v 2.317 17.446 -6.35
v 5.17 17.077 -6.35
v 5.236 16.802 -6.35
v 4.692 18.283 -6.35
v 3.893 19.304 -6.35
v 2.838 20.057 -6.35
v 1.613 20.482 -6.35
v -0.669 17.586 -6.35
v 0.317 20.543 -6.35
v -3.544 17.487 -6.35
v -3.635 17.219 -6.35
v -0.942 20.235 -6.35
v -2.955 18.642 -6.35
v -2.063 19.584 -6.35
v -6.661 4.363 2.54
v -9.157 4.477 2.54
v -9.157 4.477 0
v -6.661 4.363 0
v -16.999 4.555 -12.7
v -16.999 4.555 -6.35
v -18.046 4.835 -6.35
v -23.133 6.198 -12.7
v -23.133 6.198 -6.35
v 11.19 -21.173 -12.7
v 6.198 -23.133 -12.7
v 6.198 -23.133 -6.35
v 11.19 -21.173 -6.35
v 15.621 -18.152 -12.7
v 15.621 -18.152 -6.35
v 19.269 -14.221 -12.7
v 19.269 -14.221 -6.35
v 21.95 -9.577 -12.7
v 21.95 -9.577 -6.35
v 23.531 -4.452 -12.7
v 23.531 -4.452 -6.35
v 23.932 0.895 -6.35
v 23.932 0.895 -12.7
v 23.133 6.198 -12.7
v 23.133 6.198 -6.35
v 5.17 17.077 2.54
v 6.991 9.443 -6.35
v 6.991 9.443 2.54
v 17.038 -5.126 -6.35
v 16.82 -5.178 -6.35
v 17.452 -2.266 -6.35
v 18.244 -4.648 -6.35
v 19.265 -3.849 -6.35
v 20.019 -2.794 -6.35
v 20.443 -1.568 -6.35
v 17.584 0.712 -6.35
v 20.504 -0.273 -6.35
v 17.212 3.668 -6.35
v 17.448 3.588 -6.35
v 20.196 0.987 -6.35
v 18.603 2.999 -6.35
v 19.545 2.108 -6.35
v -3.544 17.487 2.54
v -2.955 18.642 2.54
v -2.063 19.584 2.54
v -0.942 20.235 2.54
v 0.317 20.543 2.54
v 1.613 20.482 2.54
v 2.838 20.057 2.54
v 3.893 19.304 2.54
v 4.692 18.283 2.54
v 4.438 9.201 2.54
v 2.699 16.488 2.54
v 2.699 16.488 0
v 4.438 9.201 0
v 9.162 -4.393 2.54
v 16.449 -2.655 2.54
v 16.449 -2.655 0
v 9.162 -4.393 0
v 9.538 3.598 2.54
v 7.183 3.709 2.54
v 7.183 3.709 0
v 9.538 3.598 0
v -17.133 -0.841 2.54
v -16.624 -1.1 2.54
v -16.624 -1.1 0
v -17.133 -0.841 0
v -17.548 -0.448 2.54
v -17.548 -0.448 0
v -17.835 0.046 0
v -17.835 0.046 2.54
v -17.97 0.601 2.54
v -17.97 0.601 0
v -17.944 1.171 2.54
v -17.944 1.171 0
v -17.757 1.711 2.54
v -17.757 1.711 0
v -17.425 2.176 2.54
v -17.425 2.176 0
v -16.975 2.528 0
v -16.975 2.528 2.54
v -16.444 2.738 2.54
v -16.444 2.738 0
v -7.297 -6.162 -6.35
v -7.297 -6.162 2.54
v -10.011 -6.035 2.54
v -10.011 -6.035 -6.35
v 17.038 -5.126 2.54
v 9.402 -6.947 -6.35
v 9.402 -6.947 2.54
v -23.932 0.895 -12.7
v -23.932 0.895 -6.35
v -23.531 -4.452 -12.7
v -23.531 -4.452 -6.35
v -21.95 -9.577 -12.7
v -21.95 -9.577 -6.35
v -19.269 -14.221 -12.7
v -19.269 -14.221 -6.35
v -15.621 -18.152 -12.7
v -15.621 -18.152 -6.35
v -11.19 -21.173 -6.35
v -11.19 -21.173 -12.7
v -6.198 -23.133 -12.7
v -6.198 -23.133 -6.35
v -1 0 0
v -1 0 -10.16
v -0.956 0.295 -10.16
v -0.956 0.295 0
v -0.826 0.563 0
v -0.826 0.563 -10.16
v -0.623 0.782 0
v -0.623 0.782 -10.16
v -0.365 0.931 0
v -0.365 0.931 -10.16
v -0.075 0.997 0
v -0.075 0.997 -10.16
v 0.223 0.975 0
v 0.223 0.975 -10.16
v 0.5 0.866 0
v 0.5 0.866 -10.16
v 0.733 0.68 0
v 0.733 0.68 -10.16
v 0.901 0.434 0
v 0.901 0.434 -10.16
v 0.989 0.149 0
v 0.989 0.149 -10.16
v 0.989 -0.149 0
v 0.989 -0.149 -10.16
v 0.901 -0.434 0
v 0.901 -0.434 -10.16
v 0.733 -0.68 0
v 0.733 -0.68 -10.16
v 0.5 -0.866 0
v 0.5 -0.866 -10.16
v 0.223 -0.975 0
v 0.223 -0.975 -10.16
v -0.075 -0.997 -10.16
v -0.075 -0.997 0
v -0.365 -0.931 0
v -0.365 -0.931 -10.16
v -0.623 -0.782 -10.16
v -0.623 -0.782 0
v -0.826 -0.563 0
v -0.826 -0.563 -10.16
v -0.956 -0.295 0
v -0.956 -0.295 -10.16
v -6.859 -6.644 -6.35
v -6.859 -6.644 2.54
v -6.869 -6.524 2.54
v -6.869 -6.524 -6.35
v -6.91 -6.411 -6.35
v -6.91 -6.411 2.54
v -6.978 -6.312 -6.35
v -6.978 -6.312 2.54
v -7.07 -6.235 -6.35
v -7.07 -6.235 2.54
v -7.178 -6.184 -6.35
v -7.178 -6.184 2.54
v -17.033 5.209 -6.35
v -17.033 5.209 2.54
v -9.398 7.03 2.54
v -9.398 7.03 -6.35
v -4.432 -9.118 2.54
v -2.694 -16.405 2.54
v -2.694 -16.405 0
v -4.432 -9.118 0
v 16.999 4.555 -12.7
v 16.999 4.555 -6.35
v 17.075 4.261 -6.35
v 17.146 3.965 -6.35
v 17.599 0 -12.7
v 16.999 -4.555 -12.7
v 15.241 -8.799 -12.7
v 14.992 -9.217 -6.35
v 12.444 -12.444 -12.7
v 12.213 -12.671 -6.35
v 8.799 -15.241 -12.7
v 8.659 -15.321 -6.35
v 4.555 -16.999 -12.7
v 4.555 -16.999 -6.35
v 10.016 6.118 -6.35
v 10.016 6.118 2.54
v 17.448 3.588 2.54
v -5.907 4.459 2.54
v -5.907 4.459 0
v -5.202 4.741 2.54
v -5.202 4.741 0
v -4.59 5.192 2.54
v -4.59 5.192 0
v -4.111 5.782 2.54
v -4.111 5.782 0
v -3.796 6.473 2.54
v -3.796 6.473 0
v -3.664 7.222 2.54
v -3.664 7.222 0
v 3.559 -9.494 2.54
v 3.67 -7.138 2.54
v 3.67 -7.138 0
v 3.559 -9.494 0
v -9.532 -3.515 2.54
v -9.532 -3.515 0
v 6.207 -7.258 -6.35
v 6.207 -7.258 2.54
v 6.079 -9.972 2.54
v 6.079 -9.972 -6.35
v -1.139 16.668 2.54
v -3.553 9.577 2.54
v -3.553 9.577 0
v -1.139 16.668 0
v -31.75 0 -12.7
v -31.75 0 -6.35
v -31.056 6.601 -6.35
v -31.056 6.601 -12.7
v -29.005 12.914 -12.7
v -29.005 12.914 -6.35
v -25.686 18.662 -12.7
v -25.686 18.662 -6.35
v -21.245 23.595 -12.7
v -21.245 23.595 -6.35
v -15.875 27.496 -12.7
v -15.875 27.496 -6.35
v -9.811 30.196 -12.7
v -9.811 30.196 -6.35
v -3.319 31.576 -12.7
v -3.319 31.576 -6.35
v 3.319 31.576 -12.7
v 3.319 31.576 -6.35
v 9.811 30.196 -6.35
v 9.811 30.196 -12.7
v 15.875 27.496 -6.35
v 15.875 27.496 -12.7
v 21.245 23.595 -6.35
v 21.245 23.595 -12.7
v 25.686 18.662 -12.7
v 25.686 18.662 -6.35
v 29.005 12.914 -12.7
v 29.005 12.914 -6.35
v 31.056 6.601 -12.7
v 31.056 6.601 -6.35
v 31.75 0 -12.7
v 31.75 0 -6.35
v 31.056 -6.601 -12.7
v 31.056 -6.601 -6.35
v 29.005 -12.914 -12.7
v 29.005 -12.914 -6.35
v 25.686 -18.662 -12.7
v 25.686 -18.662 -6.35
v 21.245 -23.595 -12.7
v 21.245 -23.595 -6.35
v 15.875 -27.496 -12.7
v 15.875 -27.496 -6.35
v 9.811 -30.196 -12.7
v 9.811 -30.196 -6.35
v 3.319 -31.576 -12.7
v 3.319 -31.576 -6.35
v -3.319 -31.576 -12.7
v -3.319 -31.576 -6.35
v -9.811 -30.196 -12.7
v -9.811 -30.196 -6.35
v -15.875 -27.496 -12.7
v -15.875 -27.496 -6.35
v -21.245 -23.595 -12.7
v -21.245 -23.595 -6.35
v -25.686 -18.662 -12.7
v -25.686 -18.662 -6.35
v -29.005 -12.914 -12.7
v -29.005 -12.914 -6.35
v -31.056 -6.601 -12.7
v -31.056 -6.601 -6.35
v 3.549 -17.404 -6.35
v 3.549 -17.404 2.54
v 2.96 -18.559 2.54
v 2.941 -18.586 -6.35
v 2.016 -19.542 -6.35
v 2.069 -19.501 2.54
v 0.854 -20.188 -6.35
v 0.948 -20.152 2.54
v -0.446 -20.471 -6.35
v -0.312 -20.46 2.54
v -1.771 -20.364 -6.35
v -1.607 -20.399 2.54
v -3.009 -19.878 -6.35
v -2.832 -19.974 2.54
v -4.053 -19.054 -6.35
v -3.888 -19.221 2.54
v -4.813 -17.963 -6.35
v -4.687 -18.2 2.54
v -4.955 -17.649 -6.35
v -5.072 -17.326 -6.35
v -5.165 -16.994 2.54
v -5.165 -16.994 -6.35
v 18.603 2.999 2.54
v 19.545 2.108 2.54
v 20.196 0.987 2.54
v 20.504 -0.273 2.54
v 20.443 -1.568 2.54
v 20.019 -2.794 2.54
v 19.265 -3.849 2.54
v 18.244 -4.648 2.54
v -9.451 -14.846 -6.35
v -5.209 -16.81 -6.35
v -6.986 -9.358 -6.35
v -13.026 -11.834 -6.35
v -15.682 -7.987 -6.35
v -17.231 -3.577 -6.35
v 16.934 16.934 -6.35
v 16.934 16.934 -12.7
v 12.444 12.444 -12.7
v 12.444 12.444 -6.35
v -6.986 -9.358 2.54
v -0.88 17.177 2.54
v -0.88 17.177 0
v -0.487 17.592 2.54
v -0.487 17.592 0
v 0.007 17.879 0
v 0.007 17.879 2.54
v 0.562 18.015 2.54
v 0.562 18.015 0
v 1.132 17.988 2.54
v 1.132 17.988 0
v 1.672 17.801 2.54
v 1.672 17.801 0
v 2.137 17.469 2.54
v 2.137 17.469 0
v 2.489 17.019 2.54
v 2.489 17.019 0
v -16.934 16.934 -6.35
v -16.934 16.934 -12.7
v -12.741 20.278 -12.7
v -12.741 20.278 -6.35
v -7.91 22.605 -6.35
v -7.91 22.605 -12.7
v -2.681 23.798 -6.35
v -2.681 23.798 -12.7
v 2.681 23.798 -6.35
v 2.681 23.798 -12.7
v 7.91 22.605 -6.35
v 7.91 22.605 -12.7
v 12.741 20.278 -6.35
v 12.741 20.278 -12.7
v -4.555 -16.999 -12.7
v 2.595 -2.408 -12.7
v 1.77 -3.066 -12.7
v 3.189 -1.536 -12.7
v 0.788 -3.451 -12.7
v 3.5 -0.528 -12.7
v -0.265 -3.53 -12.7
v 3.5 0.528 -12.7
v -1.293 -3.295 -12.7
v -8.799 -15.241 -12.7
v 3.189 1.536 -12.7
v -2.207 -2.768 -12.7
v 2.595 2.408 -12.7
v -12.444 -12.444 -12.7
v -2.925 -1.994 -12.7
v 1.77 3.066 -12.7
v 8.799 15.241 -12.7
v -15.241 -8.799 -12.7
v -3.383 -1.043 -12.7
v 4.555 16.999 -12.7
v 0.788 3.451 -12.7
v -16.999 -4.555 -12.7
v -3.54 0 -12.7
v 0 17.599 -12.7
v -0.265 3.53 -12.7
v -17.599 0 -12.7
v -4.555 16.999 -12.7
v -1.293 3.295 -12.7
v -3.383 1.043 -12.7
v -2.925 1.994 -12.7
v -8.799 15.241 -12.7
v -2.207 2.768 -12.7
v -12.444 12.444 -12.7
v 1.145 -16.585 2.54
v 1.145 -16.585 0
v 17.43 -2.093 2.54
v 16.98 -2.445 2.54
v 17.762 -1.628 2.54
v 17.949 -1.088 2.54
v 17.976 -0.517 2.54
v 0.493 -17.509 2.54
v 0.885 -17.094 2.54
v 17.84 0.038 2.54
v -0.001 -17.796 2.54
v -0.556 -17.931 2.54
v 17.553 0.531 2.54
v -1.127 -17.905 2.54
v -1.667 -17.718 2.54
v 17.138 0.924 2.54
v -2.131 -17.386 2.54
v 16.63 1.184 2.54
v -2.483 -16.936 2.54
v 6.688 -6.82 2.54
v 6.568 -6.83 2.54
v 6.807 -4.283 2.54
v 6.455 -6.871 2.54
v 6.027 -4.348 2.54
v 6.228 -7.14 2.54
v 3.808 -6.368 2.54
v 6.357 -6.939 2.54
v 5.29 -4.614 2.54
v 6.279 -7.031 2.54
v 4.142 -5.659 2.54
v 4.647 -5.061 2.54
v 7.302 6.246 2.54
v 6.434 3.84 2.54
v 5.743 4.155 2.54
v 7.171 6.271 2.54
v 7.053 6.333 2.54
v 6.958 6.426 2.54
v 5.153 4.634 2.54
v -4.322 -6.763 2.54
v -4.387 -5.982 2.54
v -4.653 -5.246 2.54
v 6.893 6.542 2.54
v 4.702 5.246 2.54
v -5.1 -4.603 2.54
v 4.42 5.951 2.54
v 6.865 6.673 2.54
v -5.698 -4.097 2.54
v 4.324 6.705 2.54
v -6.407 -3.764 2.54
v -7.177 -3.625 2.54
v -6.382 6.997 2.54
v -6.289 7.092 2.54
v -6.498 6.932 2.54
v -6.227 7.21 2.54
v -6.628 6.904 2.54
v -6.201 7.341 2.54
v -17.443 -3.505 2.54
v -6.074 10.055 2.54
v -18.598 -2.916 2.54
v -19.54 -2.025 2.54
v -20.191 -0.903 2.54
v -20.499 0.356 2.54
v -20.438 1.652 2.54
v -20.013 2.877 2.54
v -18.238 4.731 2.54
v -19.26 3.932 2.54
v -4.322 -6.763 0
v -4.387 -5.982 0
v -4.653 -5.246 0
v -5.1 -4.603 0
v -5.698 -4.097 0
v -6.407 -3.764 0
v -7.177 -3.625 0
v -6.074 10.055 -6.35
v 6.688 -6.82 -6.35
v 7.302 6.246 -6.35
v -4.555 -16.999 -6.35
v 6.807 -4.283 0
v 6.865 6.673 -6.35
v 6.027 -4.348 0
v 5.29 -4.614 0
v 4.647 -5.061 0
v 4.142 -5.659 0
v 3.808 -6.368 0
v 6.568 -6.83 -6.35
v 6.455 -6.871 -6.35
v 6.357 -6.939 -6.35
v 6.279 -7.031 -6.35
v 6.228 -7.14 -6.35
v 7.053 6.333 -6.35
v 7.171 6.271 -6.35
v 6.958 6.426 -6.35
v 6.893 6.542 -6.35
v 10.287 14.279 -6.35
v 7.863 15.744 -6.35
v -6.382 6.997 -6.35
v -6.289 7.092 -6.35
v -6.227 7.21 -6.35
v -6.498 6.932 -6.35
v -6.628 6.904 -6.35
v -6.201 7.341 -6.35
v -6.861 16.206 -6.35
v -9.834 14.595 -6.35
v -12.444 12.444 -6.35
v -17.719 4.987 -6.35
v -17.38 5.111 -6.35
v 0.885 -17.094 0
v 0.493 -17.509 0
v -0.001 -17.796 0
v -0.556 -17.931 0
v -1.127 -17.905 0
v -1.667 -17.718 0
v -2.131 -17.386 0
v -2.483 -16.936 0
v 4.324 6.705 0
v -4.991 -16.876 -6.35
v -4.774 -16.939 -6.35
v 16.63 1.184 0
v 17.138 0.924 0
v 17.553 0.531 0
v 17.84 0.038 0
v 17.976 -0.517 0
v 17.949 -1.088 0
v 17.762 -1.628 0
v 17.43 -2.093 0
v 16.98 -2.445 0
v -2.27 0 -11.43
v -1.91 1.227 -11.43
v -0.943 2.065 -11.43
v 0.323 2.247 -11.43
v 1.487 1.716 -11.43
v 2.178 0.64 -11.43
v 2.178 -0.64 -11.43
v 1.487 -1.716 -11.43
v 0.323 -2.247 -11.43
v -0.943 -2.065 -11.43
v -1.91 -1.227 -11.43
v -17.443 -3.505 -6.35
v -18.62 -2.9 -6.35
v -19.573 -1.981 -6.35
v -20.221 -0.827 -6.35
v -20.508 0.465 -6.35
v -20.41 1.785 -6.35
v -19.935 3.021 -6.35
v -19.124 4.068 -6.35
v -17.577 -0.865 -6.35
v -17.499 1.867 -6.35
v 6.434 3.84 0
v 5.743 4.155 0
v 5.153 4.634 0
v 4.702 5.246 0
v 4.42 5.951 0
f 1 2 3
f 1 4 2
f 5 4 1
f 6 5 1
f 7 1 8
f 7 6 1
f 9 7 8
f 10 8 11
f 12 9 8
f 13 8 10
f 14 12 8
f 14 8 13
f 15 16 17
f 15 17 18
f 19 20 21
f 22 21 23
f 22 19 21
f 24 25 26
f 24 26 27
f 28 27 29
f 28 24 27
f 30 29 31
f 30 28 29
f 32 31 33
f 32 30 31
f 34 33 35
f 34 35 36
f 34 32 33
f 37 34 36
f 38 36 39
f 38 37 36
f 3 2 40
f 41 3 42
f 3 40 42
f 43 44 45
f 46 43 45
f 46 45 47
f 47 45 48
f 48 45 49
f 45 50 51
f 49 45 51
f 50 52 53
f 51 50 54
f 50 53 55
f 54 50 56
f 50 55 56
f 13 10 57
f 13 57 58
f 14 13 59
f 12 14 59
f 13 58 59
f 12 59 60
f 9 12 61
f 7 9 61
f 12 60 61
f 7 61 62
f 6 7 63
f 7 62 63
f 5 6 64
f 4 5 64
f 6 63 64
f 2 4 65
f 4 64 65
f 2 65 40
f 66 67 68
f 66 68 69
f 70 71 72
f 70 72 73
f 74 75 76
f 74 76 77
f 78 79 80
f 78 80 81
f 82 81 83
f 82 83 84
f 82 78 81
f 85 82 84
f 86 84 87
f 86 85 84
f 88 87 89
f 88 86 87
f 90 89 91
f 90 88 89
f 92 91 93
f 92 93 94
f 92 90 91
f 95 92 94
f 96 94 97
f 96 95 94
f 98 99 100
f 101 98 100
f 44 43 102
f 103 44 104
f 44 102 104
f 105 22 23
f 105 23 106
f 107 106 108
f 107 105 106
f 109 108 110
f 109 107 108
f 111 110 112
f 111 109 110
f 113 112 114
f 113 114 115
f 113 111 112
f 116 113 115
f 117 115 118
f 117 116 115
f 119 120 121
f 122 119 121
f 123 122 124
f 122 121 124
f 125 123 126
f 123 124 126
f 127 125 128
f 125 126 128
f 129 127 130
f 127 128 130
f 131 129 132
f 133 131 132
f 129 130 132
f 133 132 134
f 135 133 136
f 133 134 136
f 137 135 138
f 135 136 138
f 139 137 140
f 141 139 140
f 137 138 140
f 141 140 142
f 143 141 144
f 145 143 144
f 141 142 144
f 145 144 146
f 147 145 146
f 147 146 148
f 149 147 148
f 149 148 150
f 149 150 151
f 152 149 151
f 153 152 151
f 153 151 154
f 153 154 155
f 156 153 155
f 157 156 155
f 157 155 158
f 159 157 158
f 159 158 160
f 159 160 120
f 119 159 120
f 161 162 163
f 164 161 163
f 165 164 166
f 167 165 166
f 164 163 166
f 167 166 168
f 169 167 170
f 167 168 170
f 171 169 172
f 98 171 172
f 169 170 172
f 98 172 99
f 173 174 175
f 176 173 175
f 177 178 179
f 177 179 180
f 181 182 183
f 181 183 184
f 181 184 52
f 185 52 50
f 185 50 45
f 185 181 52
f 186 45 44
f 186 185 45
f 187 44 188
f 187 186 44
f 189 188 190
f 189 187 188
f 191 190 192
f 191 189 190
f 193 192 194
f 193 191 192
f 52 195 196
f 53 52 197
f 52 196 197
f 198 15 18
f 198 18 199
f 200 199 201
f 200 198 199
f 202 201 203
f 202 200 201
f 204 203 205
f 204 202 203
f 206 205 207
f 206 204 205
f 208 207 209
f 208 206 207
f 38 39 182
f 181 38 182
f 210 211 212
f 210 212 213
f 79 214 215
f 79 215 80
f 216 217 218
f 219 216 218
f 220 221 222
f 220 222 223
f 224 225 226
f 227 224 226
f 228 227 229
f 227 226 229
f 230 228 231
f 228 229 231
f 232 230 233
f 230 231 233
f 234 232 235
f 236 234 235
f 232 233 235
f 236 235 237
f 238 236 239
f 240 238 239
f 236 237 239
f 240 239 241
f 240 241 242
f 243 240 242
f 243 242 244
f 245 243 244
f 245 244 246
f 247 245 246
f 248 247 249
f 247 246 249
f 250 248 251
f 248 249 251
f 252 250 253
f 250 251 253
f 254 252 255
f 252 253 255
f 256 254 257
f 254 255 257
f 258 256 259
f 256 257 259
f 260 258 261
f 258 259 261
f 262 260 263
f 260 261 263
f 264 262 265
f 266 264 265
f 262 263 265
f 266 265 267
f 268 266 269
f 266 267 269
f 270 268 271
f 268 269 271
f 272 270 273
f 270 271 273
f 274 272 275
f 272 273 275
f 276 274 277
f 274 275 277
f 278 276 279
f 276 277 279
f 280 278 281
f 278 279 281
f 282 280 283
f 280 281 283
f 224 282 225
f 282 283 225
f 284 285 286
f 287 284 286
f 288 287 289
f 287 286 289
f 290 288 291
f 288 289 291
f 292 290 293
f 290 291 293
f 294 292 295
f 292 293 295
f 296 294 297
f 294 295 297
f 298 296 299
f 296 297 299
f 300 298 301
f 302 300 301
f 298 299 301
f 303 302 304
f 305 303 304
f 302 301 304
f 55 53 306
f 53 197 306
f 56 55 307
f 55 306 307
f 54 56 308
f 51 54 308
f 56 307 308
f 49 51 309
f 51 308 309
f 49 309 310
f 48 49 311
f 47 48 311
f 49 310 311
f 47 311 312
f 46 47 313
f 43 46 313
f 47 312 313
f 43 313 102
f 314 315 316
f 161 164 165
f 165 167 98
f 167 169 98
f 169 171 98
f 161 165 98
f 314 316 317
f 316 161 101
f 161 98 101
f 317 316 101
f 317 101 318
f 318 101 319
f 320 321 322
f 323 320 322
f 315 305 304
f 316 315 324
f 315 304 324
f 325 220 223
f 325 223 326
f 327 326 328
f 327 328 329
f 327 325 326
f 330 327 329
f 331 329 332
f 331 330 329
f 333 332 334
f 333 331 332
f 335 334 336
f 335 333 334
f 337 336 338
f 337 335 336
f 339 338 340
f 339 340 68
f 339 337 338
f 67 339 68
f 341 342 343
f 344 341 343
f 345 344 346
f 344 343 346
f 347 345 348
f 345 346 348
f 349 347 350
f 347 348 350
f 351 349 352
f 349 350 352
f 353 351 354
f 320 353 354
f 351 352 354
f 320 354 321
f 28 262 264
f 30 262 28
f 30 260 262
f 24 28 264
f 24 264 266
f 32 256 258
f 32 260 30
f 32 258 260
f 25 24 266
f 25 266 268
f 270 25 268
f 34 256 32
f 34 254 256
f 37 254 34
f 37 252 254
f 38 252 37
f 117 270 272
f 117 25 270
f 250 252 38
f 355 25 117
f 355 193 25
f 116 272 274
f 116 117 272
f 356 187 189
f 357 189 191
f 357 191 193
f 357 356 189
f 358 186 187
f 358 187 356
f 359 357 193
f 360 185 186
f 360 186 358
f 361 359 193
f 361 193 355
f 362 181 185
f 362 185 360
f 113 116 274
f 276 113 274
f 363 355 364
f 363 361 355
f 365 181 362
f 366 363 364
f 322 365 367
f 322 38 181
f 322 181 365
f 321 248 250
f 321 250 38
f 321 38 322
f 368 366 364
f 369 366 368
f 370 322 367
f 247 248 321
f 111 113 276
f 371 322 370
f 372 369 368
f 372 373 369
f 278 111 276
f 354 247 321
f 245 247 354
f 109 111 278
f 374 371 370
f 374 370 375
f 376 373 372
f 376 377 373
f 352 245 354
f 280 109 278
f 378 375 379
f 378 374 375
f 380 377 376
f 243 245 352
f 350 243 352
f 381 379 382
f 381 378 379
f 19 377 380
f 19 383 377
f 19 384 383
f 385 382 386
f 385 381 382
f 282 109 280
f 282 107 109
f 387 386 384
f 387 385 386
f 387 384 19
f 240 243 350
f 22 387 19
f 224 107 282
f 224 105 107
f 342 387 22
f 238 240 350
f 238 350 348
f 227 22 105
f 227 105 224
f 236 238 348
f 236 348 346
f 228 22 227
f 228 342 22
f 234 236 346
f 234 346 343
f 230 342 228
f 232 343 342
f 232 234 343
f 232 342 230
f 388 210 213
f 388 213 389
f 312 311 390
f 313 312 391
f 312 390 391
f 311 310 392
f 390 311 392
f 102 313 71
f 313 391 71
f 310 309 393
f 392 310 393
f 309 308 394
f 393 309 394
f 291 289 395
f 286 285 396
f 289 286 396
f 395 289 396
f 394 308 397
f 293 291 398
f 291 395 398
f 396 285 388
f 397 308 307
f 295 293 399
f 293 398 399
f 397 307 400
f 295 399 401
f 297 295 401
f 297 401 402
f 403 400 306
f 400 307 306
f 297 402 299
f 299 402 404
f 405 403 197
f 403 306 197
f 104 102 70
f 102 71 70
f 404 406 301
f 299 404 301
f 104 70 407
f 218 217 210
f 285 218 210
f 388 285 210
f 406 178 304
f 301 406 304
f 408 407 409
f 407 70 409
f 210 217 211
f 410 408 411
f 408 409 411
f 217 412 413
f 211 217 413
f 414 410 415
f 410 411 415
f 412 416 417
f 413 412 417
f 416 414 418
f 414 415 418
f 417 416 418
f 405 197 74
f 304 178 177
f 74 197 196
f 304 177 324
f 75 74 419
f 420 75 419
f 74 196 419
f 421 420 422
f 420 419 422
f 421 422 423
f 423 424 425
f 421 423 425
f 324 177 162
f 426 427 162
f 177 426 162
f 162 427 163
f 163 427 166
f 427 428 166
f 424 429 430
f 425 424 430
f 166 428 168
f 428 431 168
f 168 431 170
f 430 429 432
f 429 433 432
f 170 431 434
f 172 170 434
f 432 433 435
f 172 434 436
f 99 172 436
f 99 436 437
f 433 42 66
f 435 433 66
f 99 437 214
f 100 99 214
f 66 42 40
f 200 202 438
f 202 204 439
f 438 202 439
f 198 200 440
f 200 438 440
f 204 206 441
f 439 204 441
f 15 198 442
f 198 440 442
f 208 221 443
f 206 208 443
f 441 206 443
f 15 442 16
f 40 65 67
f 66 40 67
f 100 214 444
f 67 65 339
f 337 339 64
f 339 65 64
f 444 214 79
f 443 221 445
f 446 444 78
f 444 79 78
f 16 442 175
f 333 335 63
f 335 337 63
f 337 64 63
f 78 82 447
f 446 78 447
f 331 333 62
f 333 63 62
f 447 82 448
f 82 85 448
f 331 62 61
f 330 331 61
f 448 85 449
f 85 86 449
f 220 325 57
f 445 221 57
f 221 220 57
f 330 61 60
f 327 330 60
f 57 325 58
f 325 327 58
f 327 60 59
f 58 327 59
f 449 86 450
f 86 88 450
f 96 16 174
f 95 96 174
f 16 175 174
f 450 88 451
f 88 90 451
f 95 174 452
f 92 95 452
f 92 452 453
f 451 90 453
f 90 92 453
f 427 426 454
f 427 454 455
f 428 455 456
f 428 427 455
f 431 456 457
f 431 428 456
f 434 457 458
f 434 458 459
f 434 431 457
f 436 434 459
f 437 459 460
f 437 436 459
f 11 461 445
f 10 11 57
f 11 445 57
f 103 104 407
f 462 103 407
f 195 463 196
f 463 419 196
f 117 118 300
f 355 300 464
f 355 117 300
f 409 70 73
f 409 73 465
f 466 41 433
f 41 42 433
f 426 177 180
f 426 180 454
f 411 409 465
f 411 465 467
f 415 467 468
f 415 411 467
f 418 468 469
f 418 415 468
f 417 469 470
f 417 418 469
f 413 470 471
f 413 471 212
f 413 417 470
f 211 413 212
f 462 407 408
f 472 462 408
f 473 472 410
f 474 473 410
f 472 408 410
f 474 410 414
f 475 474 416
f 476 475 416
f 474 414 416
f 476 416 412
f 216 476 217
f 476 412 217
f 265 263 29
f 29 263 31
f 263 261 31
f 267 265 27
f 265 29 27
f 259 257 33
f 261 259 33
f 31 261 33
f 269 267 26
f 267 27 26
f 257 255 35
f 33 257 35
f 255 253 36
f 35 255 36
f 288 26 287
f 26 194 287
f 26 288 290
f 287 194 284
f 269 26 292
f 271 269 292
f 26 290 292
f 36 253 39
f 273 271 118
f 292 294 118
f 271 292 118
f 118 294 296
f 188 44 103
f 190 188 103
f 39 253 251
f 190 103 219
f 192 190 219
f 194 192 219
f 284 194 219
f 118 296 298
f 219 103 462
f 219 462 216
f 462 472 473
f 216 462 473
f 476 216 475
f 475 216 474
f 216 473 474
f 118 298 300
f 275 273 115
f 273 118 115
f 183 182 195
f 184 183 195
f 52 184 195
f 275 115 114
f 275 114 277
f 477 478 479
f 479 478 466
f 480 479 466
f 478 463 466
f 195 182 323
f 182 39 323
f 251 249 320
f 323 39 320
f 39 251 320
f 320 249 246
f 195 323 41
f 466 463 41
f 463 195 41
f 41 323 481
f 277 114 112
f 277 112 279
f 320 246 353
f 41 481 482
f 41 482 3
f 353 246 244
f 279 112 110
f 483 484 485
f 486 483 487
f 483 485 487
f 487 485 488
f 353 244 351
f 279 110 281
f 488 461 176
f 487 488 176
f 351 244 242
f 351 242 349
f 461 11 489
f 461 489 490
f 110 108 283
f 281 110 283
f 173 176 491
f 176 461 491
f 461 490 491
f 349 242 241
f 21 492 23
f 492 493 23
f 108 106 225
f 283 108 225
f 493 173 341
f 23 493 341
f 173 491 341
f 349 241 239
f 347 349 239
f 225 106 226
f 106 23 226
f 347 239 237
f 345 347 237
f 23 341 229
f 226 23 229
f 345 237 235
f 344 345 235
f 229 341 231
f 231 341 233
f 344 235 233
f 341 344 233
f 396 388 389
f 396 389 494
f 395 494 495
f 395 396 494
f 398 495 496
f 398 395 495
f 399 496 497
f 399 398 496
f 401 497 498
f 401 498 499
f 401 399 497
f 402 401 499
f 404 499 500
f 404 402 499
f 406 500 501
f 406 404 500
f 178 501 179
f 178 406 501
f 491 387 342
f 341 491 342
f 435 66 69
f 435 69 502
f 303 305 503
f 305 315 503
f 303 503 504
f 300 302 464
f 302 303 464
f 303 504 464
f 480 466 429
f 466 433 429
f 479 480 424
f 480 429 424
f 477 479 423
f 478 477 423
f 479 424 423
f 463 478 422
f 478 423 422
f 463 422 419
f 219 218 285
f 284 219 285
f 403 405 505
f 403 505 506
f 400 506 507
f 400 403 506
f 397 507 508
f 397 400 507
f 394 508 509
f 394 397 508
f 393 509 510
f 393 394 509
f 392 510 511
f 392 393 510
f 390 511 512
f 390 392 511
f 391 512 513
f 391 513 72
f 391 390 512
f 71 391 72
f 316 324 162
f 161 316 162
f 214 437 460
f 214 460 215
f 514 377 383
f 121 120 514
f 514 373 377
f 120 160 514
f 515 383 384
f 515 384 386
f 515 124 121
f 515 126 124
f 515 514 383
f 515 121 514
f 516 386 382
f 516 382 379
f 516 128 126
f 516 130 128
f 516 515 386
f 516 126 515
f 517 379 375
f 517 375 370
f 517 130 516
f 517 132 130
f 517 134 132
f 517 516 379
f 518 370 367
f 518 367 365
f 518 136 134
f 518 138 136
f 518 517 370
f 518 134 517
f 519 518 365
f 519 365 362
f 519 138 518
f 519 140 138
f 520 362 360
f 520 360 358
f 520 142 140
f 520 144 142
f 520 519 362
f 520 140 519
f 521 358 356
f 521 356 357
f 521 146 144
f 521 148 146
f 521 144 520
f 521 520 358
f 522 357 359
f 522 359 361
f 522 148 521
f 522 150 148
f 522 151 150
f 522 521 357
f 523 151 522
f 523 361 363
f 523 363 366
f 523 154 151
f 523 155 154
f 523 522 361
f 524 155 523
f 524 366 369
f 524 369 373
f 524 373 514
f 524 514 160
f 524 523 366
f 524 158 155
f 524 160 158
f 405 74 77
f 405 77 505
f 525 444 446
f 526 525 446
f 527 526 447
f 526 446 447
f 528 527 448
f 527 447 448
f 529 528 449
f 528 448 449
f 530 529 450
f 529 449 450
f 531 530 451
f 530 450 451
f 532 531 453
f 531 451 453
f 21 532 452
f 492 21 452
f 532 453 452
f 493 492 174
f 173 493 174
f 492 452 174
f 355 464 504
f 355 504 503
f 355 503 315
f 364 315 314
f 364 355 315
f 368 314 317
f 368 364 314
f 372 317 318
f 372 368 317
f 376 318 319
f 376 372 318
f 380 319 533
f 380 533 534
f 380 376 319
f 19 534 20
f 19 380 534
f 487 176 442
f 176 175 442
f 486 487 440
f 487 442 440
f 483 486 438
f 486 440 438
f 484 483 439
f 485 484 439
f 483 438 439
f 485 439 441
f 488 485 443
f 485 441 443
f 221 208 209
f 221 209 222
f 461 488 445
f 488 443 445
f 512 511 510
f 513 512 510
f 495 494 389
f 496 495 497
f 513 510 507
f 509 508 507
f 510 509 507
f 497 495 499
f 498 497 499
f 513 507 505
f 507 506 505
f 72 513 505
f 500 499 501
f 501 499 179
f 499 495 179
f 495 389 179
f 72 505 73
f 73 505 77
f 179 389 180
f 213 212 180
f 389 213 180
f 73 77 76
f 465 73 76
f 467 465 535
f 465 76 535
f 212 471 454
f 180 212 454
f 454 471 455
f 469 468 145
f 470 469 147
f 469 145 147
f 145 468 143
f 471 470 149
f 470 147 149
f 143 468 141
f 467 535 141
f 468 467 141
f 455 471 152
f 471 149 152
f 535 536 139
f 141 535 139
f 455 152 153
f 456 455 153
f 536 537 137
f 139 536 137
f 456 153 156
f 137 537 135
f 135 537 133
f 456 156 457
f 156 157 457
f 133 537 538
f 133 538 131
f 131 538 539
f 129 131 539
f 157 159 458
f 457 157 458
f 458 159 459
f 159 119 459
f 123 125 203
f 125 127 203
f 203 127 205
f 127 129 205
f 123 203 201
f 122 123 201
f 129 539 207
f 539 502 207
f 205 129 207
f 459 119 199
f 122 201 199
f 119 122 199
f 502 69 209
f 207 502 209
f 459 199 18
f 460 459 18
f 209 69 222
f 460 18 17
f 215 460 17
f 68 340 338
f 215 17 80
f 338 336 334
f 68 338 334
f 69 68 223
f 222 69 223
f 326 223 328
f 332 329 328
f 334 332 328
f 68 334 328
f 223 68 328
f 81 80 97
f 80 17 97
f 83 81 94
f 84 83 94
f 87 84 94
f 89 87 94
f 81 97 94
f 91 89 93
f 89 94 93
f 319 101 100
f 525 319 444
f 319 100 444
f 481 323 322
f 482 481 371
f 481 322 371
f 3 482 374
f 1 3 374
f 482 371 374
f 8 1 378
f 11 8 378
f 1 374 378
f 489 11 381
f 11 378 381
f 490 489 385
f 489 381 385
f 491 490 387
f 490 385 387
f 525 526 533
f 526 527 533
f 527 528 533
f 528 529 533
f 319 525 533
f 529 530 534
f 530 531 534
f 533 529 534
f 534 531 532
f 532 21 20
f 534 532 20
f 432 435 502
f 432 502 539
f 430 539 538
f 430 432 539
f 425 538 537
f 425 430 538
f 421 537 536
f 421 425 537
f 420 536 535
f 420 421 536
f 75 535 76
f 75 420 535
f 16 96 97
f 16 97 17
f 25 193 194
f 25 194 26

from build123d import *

# Parameters (mm, degrees)
EXTRUDE_THIN1_DEPTH = 2.54
EXTRUDE_THIN2_DEPTH = 6.35
BOSS_EXTRUDE1_DEPTH = 6.35
SKETCH2_R           = 31.75
BOSS_EXTRUDE2_DEPTH = 6.35
CUT_EXTRUDE1_DEPTH  = 6.35
SKETCH4_R           = 1
CUT_EXTRUDE2_DEPTH  = 16.24
CHAMFER2_SIZE       = 2.54


with BuildPart() as part:
    # Sketch1 → Extrude-Thin1 (new body)
    with BuildSketch(Plane.XY):
        with BuildLine():
            Line((-17.033098657, 5.209024178), (-9.398237952, 7.030294761))
            Line((-9.398237952, 7.030294761), (-6.628258472, 6.90375806))
            ThreePointArc((-6.628258472, 6.90375806), (-6.331733624, 7.041258836), (-6.201391634, 7.340999415))
            Line((-6.201391634, 7.340999415), (-6.07380581, 10.055084177))
            Line((-6.07380581, 10.055084177), (-3.543785692, 17.487046073))
            ThreePointArc((-3.543785692, 17.487046073), (0.967191009, 20.558965329), (5.170097171, 17.077417038))
            Line((5.170097171, 17.077417038), (6.991367754, 9.442556334))
            Line((6.991367754, 9.442556334), (6.864831053, 6.672576854))
            ThreePointArc((6.864831053, 6.672576854), (7.002331829, 6.376052005), (7.302072408, 6.245710016))
            Line((7.302072408, 6.245710016), (10.01615717, 6.118124192))
            Line((10.01615717, 6.118124192), (17.448119066, 3.588104073))
            ThreePointArc((17.448119066, 3.588104073), (20.520038322, -0.922872627), (17.038490031, -5.125778789))
            Line((17.038490031, -5.125778789), (9.401960539, -6.947447456))
            Line((9.401960539, -6.947447456), (6.687875777, -6.819861633))
            ThreePointArc((6.687875777, -6.819861633), (6.356638909, -6.939170255), (6.206783009, -7.257754026))
            Line((6.206783009, -7.257754026), (6.079197185, -9.971838788))
            Line((6.079197185, -9.971838788), (3.549177067, -17.403800684))
            ThreePointArc((3.549177067, -17.403800684), (-0.961799634, -20.47571994), (-5.164705796, -16.99417165))
            Line((-5.164705796, -16.99417165), (-6.986374463, -9.357642157))
            Line((-6.986374463, -9.357642157), (-6.85878864, -6.643557395))
            ThreePointArc((-6.85878864, -6.643557395), (-6.978097262, -6.312320527), (-7.296681033, -6.162464627))
            Line((-7.296681033, -6.162464627), (-10.010765795, -6.034878804))
            Line((-10.010765795, -6.034878804), (-17.442727691, -3.504858685))
            ThreePointArc((-17.442727691, -3.504858685), (-20.514646947, 1.006118016), (-17.033098657, 5.209024178))
        make_face()
        with BuildLine():
            Line((-16.443727069, 2.738347928), (-9.156812059, 4.476617225))
            Line((-9.156812059, 4.476617225), (-6.660884215, 4.362599602))
            ThreePointArc((-6.660884215, 4.362599602), (-4.589968036, 5.192045254), (-3.66419347, 7.221728815))
            Line((-3.66419347, 7.221728815), (-3.553485102, 9.576785873))
            Line((-3.553485102, 9.576785873), (-1.139293996, 16.66849877))
            ThreePointArc((-1.139293996, 16.66849877), (0.847920409, 18.021767165), (2.699420921, 16.488045451))
            Line((2.699420921, 16.488045451), (4.437690218, 9.201130441))
            Line((4.437690218, 9.201130441), (4.323672595, 6.705202597))
            ThreePointArc((4.323672595, 6.705202597), (5.153118247, 4.634286418), (7.182801808, 3.708511852))
            Line((7.182801808, 3.708511852), (9.537858866, 3.597803484))
            Line((9.537858866, 3.597803484), (16.629571763, 1.183612378))
            ThreePointArc((16.629571763, 1.183612378), (17.982840158, -0.803602027), (16.449118444, -2.655102539))
            Line((16.449118444, -2.655102539), (9.162203434, -4.393371836))
            Line((9.162203434, -4.393371836), (6.807146377, -4.282663469))
            ThreePointArc((6.807146377, -4.282663469), (4.646905931, -5.060763178), (3.669584845, -7.138483427))
            Line((3.669584845, -7.138483427), (3.558876477, -9.493540484))
            Line((3.558876477, -9.493540484), (1.144685371, -16.585253381))
            ThreePointArc((1.144685371, -16.585253381), (-0.842529034, -17.938521776), (-2.694029546, -16.404800062))
            Line((-2.694029546, -16.404800062), (-4.432298843, -9.117885052))
            Line((-4.432298843, -9.117885052), (-4.321590476, -6.762827995))
            ThreePointArc((-4.321590476, -6.762827995), (-5.099690185, -4.60258755), (-7.177410434, -3.625266463))
            Line((-7.177410434, -3.625266463), (-9.532467491, -3.514558095))
            Line((-9.532467491, -3.514558095), (-16.624180388, -1.100366989))
            ThreePointArc((-16.624180388, -1.100366989), (-17.977448783, 0.886847416), (-16.443727069, 2.738347928))
        make_face(mode=Mode.SUBTRACT)
    extrude(amount=EXTRUDE_THIN1_DEPTH)

    # Sketch1<5> → Extrude-Thin2 (add)
    with BuildSketch(Plane.XY):
        with BuildLine():
            Line((-17.033098657, 5.209024178), (-9.398237952, 7.030294761))
            Line((-9.398237952, 7.030294761), (-6.628258472, 6.90375806))
            ThreePointArc((-6.628258472, 6.90375806), (-6.331733624, 7.041258836), (-6.201391634, 7.340999415))
            Line((-6.201391634, 7.340999415), (-6.07380581, 10.055084177))
            Line((-6.07380581, 10.055084177), (-3.543785692, 17.487046073))
            ThreePointArc((-3.543785692, 17.487046073), (0.967191009, 20.558965329), (5.170097171, 17.077417038))
            Line((5.170097171, 17.077417038), (6.991367754, 9.442556334))
            Line((6.991367754, 9.442556334), (6.864831053, 6.672576854))
            ThreePointArc((6.864831053, 6.672576854), (7.002331829, 6.376052005), (7.302072408, 6.245710016))
            Line((7.302072408, 6.245710016), (10.01615717, 6.118124192))
            Line((10.01615717, 6.118124192), (17.448119066, 3.588104073))
            ThreePointArc((17.448119066, 3.588104073), (20.520038322, -0.922872627), (17.038490031, -5.125778789))
            Line((17.038490031, -5.125778789), (9.401960539, -6.947447456))
            Line((9.401960539, -6.947447456), (6.687875777, -6.819861633))
            ThreePointArc((6.687875777, -6.819861633), (6.356638909, -6.939170255), (6.206783009, -7.257754026))
            Line((6.206783009, -7.257754026), (6.079197185, -9.971838788))
            Line((6.079197185, -9.971838788), (3.549177067, -17.403800684))
            ThreePointArc((3.549177067, -17.403800684), (-0.961799634, -20.47571994), (-5.164705796, -16.99417165))
            Line((-5.164705796, -16.99417165), (-6.986374463, -9.357642157))
            Line((-6.986374463, -9.357642157), (-6.85878864, -6.643557395))
            ThreePointArc((-6.85878864, -6.643557395), (-6.978097262, -6.312320527), (-7.296681033, -6.162464627))
            Line((-7.296681033, -6.162464627), (-10.010765795, -6.034878804))
            Line((-10.010765795, -6.034878804), (-17.442727691, -3.504858685))
            ThreePointArc((-17.442727691, -3.504858685), (-20.514646947, 1.006118016), (-17.033098657, 5.209024178))
        make_face()
        with BuildLine():
            Line((-16.443727069, 2.738347928), (-9.156812059, 4.476617225))
            Line((-9.156812059, 4.476617225), (-6.660884215, 4.362599602))
            ThreePointArc((-6.660884215, 4.362599602), (-4.589968036, 5.192045254), (-3.66419347, 7.221728815))
            Line((-3.66419347, 7.221728815), (-3.553485102, 9.576785873))
            Line((-3.553485102, 9.576785873), (-1.139293996, 16.66849877))
            ThreePointArc((-1.139293996, 16.66849877), (0.847920409, 18.021767165), (2.699420921, 16.488045451))
            Line((2.699420921, 16.488045451), (4.437690218, 9.201130441))
            Line((4.437690218, 9.201130441), (4.323672595, 6.705202597))
            ThreePointArc((4.323672595, 6.705202597), (5.153118247, 4.634286418), (7.182801808, 3.708511852))
            Line((7.182801808, 3.708511852), (9.537858866, 3.597803484))
            Line((9.537858866, 3.597803484), (16.629571763, 1.183612378))
            ThreePointArc((16.629571763, 1.183612378), (17.982840158, -0.803602027), (16.449118444, -2.655102539))
            Line((16.449118444, -2.655102539), (9.162203434, -4.393371836))
            Line((9.162203434, -4.393371836), (6.807146377, -4.282663469))
            ThreePointArc((6.807146377, -4.282663469), (4.646905931, -5.060763178), (3.669584845, -7.138483427))
            Line((3.669584845, -7.138483427), (3.558876477, -9.493540484))
            Line((3.558876477, -9.493540484), (1.144685371, -16.585253381))
            ThreePointArc((1.144685371, -16.585253381), (-0.842529034, -17.938521776), (-2.694029546, -16.404800062))
            Line((-2.694029546, -16.404800062), (-4.432298843, -9.117885052))
            Line((-4.432298843, -9.117885052), (-4.321590476, -6.762827995))
            ThreePointArc((-4.321590476, -6.762827995), (-5.099690185, -4.60258755), (-7.177410434, -3.625266463))
            Line((-7.177410434, -3.625266463), (-9.532467491, -3.514558095))
            Line((-9.532467491, -3.514558095), (-16.624180388, -1.100366989))
            ThreePointArc((-16.624180388, -1.100366989), (-17.977448783, 0.886847416), (-16.443727069, 2.738347928))
        make_face(mode=Mode.SUBTRACT)
    extrude(amount=-EXTRUDE_THIN2_DEPTH)

    # Sketch1<6> → Boss-Extrude1 (add)
    with BuildSketch(Plane.XY):
        with BuildLine():
            ThreePointArc((-16.624180388, -1.100366989), (-17.977448783, 0.886847416), (-16.443727069, 2.738347928))
            Line((-16.443727069, 2.738347928), (-9.156812059, 4.476617225))
            Line((-9.156812059, 4.476617225), (-6.660884215, 4.362599602))
            ThreePointArc((-6.660884215, 4.362599602), (-4.589968036, 5.192045254), (-3.66419347, 7.221728815))
            Line((-3.66419347, 7.221728815), (-3.553485102, 9.576785873))
            Line((-3.553485102, 9.576785873), (-1.139293996, 16.66849877))
            ThreePointArc((-1.139293996, 16.66849877), (0.847920409, 18.021767165), (2.699420921, 16.488045451))
            Line((2.699420921, 16.488045451), (4.437690218, 9.201130441))
            Line((4.437690218, 9.201130441), (4.323672595, 6.705202597))
            ThreePointArc((4.323672595, 6.705202597), (5.153118247, 4.634286418), (7.182801808, 3.708511852))
            Line((7.182801808, 3.708511852), (9.537858866, 3.597803484))
            Line((9.537858866, 3.597803484), (16.629571763, 1.183612378))
            ThreePointArc((16.629571763, 1.183612378), (17.982840158, -0.803602027), (16.449118444, -2.655102539))
            Line((16.449118444, -2.655102539), (9.162203434, -4.393371836))
            Line((9.162203434, -4.393371836), (6.807146377, -4.282663469))
            ThreePointArc((6.807146377, -4.282663469), (4.646905931, -5.060763178), (3.669584845, -7.138483427))
            Line((3.669584845, -7.138483427), (3.558876477, -9.493540484))
            Line((3.558876477, -9.493540484), (1.144685371, -16.585253381))
            ThreePointArc((1.144685371, -16.585253381), (-0.842529034, -17.938521776), (-2.694029546, -16.404800062))
            Line((-2.694029546, -16.404800062), (-4.432298843, -9.117885052))
            Line((-4.432298843, -9.117885052), (-4.321590476, -6.762827995))
            ThreePointArc((-4.321590476, -6.762827995), (-5.099690185, -4.60258755), (-7.177410434, -3.625266463))
            Line((-7.177410434, -3.625266463), (-9.532467491, -3.514558095))
            Line((-9.532467491, -3.514558095), (-16.624180388, -1.100366989))
        make_face()
    extrude(amount=-BOSS_EXTRUDE1_DEPTH)

    # Sketch2 → Boss-Extrude2 (add)
    with BuildSketch(Plane(origin=(0, 0, -6.35), x_dir=(-1, 0, 0), z_dir=(0, 0, -1))):
        Circle(SKETCH2_R)
    extrude(amount=BOSS_EXTRUDE2_DEPTH)

    # Sketch3 → Cut-Extrude1 (cut)
    with BuildSketch(Plane(origin=(0, 0, -12.7), x_dir=(-1, 0, 0), z_dir=(0, 0, -1))):
        with BuildLine():
            Line((-16.934288716, 16.934288716), (-12.444160656, 12.444160656))
            ThreePointArc((-12.444160656, 12.444160656), (0, 17.598700771), (12.444160656, 12.444160656))
            Line((12.444160656, 12.444160656), (16.934288716, 16.934288716))
            ThreePointArc((16.934288716, 16.934288716), (0, 23.948700771), (-16.934288716, 16.934288716))
        make_face()
        with BuildLine():
            Line((6.198379865, -23.132668581), (4.554878929, -16.999039584))
            ThreePointArc((4.554878929, -16.999039584), (15.240921942, -8.799350386), (16.999039584, 4.554878929))
            Line((16.999039584, 4.554878929), (23.132668581, 6.198379865))
            ThreePointArc((23.132668581, 6.198379865), (20.740183256, -11.974350386), (6.198379865, -23.132668581))
        make_face()
        with BuildLine():
            Line((-23.132668581, 6.198379865), (-16.999039584, 4.554878929))
            ThreePointArc((-16.999039584, 4.554878929), (-15.240921942, -8.799350386), (-4.554878929, -16.999039584))
            Line((-4.554878929, -16.999039584), (-6.198379865, -23.132668581))
            ThreePointArc((-6.198379865, -23.132668581), (-20.740183256, -11.974350386), (-23.132668581, 6.198379865))
        make_face()
    extrude(amount=-CUT_EXTRUDE1_DEPTH, mode=Mode.SUBTRACT)

    # Sketch4 → Cut-Extrude2 (cut, through all)
    with BuildSketch(Plane(origin=(0, 0, -12.7), x_dir=(-1, 0, 0), z_dir=(0, 0, -1))):
        Circle(SKETCH4_R)
    extrude(amount=-CUT_EXTRUDE2_DEPTH, mode=Mode.SUBTRACT)

    # Chamfer2
    chamfer2_edges = [part.edges().sort_by_distance(p)[0] for p in [
        (1, 0, -12.7),
    ]]
    chamfer(chamfer2_edges, length=CHAMFER2_SIZE)


solid = part.part
